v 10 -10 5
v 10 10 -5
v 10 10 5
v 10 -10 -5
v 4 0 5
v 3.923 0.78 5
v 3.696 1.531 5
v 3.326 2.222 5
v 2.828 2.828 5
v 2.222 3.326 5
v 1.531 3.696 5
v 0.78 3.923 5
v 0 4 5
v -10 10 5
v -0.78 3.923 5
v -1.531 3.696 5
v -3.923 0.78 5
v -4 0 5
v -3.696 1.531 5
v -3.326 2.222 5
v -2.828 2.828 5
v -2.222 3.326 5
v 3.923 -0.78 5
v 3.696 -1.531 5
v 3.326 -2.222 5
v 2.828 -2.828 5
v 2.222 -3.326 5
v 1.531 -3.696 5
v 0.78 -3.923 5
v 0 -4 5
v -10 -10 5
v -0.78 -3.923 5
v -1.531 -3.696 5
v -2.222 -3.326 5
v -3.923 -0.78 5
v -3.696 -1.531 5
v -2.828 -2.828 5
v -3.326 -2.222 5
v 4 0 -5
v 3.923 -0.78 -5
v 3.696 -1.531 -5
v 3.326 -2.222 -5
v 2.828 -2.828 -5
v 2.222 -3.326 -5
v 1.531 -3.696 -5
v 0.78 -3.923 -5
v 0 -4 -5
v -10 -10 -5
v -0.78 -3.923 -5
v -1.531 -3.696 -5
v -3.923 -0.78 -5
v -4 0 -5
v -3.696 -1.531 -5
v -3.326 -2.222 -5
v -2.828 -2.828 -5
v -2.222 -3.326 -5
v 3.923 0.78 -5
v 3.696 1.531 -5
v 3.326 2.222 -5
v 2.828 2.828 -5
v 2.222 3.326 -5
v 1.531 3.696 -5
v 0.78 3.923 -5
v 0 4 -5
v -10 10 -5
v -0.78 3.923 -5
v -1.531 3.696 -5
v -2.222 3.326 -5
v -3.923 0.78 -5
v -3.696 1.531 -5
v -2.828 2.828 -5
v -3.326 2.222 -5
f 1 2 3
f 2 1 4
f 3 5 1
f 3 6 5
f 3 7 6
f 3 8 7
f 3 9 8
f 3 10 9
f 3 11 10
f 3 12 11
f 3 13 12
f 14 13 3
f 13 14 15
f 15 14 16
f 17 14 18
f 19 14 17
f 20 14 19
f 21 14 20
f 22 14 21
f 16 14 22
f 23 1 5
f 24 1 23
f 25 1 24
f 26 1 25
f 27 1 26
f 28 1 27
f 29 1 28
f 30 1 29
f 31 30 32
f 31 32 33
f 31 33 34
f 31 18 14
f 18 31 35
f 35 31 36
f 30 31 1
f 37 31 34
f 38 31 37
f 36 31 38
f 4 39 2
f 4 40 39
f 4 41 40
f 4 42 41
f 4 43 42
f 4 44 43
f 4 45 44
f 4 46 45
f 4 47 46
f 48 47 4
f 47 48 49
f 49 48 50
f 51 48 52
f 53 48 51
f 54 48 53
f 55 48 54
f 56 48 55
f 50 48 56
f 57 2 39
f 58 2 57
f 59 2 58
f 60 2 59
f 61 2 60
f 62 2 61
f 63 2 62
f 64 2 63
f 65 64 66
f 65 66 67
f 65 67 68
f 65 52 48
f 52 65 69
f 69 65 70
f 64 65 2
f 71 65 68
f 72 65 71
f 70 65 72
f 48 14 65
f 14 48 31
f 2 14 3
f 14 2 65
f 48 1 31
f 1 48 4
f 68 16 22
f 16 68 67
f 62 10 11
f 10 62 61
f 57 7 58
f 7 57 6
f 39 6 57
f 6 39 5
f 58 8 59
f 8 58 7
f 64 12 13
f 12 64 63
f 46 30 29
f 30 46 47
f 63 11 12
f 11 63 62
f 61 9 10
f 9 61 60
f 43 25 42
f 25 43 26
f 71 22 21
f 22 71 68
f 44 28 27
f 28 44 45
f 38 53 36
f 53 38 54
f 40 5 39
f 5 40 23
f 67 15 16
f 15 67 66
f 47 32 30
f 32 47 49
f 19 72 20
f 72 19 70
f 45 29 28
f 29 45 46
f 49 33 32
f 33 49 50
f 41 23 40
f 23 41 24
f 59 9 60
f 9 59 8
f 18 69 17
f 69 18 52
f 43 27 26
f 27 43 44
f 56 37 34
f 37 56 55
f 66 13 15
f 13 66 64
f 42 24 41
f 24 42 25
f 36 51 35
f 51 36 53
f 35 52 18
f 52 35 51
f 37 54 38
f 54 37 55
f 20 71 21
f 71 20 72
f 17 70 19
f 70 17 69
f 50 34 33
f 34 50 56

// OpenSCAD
difference() {
  cube([20, 20, 10], center = true);
  cylinder(h = 30, r = 4, center = true, $fn = 32);
}
